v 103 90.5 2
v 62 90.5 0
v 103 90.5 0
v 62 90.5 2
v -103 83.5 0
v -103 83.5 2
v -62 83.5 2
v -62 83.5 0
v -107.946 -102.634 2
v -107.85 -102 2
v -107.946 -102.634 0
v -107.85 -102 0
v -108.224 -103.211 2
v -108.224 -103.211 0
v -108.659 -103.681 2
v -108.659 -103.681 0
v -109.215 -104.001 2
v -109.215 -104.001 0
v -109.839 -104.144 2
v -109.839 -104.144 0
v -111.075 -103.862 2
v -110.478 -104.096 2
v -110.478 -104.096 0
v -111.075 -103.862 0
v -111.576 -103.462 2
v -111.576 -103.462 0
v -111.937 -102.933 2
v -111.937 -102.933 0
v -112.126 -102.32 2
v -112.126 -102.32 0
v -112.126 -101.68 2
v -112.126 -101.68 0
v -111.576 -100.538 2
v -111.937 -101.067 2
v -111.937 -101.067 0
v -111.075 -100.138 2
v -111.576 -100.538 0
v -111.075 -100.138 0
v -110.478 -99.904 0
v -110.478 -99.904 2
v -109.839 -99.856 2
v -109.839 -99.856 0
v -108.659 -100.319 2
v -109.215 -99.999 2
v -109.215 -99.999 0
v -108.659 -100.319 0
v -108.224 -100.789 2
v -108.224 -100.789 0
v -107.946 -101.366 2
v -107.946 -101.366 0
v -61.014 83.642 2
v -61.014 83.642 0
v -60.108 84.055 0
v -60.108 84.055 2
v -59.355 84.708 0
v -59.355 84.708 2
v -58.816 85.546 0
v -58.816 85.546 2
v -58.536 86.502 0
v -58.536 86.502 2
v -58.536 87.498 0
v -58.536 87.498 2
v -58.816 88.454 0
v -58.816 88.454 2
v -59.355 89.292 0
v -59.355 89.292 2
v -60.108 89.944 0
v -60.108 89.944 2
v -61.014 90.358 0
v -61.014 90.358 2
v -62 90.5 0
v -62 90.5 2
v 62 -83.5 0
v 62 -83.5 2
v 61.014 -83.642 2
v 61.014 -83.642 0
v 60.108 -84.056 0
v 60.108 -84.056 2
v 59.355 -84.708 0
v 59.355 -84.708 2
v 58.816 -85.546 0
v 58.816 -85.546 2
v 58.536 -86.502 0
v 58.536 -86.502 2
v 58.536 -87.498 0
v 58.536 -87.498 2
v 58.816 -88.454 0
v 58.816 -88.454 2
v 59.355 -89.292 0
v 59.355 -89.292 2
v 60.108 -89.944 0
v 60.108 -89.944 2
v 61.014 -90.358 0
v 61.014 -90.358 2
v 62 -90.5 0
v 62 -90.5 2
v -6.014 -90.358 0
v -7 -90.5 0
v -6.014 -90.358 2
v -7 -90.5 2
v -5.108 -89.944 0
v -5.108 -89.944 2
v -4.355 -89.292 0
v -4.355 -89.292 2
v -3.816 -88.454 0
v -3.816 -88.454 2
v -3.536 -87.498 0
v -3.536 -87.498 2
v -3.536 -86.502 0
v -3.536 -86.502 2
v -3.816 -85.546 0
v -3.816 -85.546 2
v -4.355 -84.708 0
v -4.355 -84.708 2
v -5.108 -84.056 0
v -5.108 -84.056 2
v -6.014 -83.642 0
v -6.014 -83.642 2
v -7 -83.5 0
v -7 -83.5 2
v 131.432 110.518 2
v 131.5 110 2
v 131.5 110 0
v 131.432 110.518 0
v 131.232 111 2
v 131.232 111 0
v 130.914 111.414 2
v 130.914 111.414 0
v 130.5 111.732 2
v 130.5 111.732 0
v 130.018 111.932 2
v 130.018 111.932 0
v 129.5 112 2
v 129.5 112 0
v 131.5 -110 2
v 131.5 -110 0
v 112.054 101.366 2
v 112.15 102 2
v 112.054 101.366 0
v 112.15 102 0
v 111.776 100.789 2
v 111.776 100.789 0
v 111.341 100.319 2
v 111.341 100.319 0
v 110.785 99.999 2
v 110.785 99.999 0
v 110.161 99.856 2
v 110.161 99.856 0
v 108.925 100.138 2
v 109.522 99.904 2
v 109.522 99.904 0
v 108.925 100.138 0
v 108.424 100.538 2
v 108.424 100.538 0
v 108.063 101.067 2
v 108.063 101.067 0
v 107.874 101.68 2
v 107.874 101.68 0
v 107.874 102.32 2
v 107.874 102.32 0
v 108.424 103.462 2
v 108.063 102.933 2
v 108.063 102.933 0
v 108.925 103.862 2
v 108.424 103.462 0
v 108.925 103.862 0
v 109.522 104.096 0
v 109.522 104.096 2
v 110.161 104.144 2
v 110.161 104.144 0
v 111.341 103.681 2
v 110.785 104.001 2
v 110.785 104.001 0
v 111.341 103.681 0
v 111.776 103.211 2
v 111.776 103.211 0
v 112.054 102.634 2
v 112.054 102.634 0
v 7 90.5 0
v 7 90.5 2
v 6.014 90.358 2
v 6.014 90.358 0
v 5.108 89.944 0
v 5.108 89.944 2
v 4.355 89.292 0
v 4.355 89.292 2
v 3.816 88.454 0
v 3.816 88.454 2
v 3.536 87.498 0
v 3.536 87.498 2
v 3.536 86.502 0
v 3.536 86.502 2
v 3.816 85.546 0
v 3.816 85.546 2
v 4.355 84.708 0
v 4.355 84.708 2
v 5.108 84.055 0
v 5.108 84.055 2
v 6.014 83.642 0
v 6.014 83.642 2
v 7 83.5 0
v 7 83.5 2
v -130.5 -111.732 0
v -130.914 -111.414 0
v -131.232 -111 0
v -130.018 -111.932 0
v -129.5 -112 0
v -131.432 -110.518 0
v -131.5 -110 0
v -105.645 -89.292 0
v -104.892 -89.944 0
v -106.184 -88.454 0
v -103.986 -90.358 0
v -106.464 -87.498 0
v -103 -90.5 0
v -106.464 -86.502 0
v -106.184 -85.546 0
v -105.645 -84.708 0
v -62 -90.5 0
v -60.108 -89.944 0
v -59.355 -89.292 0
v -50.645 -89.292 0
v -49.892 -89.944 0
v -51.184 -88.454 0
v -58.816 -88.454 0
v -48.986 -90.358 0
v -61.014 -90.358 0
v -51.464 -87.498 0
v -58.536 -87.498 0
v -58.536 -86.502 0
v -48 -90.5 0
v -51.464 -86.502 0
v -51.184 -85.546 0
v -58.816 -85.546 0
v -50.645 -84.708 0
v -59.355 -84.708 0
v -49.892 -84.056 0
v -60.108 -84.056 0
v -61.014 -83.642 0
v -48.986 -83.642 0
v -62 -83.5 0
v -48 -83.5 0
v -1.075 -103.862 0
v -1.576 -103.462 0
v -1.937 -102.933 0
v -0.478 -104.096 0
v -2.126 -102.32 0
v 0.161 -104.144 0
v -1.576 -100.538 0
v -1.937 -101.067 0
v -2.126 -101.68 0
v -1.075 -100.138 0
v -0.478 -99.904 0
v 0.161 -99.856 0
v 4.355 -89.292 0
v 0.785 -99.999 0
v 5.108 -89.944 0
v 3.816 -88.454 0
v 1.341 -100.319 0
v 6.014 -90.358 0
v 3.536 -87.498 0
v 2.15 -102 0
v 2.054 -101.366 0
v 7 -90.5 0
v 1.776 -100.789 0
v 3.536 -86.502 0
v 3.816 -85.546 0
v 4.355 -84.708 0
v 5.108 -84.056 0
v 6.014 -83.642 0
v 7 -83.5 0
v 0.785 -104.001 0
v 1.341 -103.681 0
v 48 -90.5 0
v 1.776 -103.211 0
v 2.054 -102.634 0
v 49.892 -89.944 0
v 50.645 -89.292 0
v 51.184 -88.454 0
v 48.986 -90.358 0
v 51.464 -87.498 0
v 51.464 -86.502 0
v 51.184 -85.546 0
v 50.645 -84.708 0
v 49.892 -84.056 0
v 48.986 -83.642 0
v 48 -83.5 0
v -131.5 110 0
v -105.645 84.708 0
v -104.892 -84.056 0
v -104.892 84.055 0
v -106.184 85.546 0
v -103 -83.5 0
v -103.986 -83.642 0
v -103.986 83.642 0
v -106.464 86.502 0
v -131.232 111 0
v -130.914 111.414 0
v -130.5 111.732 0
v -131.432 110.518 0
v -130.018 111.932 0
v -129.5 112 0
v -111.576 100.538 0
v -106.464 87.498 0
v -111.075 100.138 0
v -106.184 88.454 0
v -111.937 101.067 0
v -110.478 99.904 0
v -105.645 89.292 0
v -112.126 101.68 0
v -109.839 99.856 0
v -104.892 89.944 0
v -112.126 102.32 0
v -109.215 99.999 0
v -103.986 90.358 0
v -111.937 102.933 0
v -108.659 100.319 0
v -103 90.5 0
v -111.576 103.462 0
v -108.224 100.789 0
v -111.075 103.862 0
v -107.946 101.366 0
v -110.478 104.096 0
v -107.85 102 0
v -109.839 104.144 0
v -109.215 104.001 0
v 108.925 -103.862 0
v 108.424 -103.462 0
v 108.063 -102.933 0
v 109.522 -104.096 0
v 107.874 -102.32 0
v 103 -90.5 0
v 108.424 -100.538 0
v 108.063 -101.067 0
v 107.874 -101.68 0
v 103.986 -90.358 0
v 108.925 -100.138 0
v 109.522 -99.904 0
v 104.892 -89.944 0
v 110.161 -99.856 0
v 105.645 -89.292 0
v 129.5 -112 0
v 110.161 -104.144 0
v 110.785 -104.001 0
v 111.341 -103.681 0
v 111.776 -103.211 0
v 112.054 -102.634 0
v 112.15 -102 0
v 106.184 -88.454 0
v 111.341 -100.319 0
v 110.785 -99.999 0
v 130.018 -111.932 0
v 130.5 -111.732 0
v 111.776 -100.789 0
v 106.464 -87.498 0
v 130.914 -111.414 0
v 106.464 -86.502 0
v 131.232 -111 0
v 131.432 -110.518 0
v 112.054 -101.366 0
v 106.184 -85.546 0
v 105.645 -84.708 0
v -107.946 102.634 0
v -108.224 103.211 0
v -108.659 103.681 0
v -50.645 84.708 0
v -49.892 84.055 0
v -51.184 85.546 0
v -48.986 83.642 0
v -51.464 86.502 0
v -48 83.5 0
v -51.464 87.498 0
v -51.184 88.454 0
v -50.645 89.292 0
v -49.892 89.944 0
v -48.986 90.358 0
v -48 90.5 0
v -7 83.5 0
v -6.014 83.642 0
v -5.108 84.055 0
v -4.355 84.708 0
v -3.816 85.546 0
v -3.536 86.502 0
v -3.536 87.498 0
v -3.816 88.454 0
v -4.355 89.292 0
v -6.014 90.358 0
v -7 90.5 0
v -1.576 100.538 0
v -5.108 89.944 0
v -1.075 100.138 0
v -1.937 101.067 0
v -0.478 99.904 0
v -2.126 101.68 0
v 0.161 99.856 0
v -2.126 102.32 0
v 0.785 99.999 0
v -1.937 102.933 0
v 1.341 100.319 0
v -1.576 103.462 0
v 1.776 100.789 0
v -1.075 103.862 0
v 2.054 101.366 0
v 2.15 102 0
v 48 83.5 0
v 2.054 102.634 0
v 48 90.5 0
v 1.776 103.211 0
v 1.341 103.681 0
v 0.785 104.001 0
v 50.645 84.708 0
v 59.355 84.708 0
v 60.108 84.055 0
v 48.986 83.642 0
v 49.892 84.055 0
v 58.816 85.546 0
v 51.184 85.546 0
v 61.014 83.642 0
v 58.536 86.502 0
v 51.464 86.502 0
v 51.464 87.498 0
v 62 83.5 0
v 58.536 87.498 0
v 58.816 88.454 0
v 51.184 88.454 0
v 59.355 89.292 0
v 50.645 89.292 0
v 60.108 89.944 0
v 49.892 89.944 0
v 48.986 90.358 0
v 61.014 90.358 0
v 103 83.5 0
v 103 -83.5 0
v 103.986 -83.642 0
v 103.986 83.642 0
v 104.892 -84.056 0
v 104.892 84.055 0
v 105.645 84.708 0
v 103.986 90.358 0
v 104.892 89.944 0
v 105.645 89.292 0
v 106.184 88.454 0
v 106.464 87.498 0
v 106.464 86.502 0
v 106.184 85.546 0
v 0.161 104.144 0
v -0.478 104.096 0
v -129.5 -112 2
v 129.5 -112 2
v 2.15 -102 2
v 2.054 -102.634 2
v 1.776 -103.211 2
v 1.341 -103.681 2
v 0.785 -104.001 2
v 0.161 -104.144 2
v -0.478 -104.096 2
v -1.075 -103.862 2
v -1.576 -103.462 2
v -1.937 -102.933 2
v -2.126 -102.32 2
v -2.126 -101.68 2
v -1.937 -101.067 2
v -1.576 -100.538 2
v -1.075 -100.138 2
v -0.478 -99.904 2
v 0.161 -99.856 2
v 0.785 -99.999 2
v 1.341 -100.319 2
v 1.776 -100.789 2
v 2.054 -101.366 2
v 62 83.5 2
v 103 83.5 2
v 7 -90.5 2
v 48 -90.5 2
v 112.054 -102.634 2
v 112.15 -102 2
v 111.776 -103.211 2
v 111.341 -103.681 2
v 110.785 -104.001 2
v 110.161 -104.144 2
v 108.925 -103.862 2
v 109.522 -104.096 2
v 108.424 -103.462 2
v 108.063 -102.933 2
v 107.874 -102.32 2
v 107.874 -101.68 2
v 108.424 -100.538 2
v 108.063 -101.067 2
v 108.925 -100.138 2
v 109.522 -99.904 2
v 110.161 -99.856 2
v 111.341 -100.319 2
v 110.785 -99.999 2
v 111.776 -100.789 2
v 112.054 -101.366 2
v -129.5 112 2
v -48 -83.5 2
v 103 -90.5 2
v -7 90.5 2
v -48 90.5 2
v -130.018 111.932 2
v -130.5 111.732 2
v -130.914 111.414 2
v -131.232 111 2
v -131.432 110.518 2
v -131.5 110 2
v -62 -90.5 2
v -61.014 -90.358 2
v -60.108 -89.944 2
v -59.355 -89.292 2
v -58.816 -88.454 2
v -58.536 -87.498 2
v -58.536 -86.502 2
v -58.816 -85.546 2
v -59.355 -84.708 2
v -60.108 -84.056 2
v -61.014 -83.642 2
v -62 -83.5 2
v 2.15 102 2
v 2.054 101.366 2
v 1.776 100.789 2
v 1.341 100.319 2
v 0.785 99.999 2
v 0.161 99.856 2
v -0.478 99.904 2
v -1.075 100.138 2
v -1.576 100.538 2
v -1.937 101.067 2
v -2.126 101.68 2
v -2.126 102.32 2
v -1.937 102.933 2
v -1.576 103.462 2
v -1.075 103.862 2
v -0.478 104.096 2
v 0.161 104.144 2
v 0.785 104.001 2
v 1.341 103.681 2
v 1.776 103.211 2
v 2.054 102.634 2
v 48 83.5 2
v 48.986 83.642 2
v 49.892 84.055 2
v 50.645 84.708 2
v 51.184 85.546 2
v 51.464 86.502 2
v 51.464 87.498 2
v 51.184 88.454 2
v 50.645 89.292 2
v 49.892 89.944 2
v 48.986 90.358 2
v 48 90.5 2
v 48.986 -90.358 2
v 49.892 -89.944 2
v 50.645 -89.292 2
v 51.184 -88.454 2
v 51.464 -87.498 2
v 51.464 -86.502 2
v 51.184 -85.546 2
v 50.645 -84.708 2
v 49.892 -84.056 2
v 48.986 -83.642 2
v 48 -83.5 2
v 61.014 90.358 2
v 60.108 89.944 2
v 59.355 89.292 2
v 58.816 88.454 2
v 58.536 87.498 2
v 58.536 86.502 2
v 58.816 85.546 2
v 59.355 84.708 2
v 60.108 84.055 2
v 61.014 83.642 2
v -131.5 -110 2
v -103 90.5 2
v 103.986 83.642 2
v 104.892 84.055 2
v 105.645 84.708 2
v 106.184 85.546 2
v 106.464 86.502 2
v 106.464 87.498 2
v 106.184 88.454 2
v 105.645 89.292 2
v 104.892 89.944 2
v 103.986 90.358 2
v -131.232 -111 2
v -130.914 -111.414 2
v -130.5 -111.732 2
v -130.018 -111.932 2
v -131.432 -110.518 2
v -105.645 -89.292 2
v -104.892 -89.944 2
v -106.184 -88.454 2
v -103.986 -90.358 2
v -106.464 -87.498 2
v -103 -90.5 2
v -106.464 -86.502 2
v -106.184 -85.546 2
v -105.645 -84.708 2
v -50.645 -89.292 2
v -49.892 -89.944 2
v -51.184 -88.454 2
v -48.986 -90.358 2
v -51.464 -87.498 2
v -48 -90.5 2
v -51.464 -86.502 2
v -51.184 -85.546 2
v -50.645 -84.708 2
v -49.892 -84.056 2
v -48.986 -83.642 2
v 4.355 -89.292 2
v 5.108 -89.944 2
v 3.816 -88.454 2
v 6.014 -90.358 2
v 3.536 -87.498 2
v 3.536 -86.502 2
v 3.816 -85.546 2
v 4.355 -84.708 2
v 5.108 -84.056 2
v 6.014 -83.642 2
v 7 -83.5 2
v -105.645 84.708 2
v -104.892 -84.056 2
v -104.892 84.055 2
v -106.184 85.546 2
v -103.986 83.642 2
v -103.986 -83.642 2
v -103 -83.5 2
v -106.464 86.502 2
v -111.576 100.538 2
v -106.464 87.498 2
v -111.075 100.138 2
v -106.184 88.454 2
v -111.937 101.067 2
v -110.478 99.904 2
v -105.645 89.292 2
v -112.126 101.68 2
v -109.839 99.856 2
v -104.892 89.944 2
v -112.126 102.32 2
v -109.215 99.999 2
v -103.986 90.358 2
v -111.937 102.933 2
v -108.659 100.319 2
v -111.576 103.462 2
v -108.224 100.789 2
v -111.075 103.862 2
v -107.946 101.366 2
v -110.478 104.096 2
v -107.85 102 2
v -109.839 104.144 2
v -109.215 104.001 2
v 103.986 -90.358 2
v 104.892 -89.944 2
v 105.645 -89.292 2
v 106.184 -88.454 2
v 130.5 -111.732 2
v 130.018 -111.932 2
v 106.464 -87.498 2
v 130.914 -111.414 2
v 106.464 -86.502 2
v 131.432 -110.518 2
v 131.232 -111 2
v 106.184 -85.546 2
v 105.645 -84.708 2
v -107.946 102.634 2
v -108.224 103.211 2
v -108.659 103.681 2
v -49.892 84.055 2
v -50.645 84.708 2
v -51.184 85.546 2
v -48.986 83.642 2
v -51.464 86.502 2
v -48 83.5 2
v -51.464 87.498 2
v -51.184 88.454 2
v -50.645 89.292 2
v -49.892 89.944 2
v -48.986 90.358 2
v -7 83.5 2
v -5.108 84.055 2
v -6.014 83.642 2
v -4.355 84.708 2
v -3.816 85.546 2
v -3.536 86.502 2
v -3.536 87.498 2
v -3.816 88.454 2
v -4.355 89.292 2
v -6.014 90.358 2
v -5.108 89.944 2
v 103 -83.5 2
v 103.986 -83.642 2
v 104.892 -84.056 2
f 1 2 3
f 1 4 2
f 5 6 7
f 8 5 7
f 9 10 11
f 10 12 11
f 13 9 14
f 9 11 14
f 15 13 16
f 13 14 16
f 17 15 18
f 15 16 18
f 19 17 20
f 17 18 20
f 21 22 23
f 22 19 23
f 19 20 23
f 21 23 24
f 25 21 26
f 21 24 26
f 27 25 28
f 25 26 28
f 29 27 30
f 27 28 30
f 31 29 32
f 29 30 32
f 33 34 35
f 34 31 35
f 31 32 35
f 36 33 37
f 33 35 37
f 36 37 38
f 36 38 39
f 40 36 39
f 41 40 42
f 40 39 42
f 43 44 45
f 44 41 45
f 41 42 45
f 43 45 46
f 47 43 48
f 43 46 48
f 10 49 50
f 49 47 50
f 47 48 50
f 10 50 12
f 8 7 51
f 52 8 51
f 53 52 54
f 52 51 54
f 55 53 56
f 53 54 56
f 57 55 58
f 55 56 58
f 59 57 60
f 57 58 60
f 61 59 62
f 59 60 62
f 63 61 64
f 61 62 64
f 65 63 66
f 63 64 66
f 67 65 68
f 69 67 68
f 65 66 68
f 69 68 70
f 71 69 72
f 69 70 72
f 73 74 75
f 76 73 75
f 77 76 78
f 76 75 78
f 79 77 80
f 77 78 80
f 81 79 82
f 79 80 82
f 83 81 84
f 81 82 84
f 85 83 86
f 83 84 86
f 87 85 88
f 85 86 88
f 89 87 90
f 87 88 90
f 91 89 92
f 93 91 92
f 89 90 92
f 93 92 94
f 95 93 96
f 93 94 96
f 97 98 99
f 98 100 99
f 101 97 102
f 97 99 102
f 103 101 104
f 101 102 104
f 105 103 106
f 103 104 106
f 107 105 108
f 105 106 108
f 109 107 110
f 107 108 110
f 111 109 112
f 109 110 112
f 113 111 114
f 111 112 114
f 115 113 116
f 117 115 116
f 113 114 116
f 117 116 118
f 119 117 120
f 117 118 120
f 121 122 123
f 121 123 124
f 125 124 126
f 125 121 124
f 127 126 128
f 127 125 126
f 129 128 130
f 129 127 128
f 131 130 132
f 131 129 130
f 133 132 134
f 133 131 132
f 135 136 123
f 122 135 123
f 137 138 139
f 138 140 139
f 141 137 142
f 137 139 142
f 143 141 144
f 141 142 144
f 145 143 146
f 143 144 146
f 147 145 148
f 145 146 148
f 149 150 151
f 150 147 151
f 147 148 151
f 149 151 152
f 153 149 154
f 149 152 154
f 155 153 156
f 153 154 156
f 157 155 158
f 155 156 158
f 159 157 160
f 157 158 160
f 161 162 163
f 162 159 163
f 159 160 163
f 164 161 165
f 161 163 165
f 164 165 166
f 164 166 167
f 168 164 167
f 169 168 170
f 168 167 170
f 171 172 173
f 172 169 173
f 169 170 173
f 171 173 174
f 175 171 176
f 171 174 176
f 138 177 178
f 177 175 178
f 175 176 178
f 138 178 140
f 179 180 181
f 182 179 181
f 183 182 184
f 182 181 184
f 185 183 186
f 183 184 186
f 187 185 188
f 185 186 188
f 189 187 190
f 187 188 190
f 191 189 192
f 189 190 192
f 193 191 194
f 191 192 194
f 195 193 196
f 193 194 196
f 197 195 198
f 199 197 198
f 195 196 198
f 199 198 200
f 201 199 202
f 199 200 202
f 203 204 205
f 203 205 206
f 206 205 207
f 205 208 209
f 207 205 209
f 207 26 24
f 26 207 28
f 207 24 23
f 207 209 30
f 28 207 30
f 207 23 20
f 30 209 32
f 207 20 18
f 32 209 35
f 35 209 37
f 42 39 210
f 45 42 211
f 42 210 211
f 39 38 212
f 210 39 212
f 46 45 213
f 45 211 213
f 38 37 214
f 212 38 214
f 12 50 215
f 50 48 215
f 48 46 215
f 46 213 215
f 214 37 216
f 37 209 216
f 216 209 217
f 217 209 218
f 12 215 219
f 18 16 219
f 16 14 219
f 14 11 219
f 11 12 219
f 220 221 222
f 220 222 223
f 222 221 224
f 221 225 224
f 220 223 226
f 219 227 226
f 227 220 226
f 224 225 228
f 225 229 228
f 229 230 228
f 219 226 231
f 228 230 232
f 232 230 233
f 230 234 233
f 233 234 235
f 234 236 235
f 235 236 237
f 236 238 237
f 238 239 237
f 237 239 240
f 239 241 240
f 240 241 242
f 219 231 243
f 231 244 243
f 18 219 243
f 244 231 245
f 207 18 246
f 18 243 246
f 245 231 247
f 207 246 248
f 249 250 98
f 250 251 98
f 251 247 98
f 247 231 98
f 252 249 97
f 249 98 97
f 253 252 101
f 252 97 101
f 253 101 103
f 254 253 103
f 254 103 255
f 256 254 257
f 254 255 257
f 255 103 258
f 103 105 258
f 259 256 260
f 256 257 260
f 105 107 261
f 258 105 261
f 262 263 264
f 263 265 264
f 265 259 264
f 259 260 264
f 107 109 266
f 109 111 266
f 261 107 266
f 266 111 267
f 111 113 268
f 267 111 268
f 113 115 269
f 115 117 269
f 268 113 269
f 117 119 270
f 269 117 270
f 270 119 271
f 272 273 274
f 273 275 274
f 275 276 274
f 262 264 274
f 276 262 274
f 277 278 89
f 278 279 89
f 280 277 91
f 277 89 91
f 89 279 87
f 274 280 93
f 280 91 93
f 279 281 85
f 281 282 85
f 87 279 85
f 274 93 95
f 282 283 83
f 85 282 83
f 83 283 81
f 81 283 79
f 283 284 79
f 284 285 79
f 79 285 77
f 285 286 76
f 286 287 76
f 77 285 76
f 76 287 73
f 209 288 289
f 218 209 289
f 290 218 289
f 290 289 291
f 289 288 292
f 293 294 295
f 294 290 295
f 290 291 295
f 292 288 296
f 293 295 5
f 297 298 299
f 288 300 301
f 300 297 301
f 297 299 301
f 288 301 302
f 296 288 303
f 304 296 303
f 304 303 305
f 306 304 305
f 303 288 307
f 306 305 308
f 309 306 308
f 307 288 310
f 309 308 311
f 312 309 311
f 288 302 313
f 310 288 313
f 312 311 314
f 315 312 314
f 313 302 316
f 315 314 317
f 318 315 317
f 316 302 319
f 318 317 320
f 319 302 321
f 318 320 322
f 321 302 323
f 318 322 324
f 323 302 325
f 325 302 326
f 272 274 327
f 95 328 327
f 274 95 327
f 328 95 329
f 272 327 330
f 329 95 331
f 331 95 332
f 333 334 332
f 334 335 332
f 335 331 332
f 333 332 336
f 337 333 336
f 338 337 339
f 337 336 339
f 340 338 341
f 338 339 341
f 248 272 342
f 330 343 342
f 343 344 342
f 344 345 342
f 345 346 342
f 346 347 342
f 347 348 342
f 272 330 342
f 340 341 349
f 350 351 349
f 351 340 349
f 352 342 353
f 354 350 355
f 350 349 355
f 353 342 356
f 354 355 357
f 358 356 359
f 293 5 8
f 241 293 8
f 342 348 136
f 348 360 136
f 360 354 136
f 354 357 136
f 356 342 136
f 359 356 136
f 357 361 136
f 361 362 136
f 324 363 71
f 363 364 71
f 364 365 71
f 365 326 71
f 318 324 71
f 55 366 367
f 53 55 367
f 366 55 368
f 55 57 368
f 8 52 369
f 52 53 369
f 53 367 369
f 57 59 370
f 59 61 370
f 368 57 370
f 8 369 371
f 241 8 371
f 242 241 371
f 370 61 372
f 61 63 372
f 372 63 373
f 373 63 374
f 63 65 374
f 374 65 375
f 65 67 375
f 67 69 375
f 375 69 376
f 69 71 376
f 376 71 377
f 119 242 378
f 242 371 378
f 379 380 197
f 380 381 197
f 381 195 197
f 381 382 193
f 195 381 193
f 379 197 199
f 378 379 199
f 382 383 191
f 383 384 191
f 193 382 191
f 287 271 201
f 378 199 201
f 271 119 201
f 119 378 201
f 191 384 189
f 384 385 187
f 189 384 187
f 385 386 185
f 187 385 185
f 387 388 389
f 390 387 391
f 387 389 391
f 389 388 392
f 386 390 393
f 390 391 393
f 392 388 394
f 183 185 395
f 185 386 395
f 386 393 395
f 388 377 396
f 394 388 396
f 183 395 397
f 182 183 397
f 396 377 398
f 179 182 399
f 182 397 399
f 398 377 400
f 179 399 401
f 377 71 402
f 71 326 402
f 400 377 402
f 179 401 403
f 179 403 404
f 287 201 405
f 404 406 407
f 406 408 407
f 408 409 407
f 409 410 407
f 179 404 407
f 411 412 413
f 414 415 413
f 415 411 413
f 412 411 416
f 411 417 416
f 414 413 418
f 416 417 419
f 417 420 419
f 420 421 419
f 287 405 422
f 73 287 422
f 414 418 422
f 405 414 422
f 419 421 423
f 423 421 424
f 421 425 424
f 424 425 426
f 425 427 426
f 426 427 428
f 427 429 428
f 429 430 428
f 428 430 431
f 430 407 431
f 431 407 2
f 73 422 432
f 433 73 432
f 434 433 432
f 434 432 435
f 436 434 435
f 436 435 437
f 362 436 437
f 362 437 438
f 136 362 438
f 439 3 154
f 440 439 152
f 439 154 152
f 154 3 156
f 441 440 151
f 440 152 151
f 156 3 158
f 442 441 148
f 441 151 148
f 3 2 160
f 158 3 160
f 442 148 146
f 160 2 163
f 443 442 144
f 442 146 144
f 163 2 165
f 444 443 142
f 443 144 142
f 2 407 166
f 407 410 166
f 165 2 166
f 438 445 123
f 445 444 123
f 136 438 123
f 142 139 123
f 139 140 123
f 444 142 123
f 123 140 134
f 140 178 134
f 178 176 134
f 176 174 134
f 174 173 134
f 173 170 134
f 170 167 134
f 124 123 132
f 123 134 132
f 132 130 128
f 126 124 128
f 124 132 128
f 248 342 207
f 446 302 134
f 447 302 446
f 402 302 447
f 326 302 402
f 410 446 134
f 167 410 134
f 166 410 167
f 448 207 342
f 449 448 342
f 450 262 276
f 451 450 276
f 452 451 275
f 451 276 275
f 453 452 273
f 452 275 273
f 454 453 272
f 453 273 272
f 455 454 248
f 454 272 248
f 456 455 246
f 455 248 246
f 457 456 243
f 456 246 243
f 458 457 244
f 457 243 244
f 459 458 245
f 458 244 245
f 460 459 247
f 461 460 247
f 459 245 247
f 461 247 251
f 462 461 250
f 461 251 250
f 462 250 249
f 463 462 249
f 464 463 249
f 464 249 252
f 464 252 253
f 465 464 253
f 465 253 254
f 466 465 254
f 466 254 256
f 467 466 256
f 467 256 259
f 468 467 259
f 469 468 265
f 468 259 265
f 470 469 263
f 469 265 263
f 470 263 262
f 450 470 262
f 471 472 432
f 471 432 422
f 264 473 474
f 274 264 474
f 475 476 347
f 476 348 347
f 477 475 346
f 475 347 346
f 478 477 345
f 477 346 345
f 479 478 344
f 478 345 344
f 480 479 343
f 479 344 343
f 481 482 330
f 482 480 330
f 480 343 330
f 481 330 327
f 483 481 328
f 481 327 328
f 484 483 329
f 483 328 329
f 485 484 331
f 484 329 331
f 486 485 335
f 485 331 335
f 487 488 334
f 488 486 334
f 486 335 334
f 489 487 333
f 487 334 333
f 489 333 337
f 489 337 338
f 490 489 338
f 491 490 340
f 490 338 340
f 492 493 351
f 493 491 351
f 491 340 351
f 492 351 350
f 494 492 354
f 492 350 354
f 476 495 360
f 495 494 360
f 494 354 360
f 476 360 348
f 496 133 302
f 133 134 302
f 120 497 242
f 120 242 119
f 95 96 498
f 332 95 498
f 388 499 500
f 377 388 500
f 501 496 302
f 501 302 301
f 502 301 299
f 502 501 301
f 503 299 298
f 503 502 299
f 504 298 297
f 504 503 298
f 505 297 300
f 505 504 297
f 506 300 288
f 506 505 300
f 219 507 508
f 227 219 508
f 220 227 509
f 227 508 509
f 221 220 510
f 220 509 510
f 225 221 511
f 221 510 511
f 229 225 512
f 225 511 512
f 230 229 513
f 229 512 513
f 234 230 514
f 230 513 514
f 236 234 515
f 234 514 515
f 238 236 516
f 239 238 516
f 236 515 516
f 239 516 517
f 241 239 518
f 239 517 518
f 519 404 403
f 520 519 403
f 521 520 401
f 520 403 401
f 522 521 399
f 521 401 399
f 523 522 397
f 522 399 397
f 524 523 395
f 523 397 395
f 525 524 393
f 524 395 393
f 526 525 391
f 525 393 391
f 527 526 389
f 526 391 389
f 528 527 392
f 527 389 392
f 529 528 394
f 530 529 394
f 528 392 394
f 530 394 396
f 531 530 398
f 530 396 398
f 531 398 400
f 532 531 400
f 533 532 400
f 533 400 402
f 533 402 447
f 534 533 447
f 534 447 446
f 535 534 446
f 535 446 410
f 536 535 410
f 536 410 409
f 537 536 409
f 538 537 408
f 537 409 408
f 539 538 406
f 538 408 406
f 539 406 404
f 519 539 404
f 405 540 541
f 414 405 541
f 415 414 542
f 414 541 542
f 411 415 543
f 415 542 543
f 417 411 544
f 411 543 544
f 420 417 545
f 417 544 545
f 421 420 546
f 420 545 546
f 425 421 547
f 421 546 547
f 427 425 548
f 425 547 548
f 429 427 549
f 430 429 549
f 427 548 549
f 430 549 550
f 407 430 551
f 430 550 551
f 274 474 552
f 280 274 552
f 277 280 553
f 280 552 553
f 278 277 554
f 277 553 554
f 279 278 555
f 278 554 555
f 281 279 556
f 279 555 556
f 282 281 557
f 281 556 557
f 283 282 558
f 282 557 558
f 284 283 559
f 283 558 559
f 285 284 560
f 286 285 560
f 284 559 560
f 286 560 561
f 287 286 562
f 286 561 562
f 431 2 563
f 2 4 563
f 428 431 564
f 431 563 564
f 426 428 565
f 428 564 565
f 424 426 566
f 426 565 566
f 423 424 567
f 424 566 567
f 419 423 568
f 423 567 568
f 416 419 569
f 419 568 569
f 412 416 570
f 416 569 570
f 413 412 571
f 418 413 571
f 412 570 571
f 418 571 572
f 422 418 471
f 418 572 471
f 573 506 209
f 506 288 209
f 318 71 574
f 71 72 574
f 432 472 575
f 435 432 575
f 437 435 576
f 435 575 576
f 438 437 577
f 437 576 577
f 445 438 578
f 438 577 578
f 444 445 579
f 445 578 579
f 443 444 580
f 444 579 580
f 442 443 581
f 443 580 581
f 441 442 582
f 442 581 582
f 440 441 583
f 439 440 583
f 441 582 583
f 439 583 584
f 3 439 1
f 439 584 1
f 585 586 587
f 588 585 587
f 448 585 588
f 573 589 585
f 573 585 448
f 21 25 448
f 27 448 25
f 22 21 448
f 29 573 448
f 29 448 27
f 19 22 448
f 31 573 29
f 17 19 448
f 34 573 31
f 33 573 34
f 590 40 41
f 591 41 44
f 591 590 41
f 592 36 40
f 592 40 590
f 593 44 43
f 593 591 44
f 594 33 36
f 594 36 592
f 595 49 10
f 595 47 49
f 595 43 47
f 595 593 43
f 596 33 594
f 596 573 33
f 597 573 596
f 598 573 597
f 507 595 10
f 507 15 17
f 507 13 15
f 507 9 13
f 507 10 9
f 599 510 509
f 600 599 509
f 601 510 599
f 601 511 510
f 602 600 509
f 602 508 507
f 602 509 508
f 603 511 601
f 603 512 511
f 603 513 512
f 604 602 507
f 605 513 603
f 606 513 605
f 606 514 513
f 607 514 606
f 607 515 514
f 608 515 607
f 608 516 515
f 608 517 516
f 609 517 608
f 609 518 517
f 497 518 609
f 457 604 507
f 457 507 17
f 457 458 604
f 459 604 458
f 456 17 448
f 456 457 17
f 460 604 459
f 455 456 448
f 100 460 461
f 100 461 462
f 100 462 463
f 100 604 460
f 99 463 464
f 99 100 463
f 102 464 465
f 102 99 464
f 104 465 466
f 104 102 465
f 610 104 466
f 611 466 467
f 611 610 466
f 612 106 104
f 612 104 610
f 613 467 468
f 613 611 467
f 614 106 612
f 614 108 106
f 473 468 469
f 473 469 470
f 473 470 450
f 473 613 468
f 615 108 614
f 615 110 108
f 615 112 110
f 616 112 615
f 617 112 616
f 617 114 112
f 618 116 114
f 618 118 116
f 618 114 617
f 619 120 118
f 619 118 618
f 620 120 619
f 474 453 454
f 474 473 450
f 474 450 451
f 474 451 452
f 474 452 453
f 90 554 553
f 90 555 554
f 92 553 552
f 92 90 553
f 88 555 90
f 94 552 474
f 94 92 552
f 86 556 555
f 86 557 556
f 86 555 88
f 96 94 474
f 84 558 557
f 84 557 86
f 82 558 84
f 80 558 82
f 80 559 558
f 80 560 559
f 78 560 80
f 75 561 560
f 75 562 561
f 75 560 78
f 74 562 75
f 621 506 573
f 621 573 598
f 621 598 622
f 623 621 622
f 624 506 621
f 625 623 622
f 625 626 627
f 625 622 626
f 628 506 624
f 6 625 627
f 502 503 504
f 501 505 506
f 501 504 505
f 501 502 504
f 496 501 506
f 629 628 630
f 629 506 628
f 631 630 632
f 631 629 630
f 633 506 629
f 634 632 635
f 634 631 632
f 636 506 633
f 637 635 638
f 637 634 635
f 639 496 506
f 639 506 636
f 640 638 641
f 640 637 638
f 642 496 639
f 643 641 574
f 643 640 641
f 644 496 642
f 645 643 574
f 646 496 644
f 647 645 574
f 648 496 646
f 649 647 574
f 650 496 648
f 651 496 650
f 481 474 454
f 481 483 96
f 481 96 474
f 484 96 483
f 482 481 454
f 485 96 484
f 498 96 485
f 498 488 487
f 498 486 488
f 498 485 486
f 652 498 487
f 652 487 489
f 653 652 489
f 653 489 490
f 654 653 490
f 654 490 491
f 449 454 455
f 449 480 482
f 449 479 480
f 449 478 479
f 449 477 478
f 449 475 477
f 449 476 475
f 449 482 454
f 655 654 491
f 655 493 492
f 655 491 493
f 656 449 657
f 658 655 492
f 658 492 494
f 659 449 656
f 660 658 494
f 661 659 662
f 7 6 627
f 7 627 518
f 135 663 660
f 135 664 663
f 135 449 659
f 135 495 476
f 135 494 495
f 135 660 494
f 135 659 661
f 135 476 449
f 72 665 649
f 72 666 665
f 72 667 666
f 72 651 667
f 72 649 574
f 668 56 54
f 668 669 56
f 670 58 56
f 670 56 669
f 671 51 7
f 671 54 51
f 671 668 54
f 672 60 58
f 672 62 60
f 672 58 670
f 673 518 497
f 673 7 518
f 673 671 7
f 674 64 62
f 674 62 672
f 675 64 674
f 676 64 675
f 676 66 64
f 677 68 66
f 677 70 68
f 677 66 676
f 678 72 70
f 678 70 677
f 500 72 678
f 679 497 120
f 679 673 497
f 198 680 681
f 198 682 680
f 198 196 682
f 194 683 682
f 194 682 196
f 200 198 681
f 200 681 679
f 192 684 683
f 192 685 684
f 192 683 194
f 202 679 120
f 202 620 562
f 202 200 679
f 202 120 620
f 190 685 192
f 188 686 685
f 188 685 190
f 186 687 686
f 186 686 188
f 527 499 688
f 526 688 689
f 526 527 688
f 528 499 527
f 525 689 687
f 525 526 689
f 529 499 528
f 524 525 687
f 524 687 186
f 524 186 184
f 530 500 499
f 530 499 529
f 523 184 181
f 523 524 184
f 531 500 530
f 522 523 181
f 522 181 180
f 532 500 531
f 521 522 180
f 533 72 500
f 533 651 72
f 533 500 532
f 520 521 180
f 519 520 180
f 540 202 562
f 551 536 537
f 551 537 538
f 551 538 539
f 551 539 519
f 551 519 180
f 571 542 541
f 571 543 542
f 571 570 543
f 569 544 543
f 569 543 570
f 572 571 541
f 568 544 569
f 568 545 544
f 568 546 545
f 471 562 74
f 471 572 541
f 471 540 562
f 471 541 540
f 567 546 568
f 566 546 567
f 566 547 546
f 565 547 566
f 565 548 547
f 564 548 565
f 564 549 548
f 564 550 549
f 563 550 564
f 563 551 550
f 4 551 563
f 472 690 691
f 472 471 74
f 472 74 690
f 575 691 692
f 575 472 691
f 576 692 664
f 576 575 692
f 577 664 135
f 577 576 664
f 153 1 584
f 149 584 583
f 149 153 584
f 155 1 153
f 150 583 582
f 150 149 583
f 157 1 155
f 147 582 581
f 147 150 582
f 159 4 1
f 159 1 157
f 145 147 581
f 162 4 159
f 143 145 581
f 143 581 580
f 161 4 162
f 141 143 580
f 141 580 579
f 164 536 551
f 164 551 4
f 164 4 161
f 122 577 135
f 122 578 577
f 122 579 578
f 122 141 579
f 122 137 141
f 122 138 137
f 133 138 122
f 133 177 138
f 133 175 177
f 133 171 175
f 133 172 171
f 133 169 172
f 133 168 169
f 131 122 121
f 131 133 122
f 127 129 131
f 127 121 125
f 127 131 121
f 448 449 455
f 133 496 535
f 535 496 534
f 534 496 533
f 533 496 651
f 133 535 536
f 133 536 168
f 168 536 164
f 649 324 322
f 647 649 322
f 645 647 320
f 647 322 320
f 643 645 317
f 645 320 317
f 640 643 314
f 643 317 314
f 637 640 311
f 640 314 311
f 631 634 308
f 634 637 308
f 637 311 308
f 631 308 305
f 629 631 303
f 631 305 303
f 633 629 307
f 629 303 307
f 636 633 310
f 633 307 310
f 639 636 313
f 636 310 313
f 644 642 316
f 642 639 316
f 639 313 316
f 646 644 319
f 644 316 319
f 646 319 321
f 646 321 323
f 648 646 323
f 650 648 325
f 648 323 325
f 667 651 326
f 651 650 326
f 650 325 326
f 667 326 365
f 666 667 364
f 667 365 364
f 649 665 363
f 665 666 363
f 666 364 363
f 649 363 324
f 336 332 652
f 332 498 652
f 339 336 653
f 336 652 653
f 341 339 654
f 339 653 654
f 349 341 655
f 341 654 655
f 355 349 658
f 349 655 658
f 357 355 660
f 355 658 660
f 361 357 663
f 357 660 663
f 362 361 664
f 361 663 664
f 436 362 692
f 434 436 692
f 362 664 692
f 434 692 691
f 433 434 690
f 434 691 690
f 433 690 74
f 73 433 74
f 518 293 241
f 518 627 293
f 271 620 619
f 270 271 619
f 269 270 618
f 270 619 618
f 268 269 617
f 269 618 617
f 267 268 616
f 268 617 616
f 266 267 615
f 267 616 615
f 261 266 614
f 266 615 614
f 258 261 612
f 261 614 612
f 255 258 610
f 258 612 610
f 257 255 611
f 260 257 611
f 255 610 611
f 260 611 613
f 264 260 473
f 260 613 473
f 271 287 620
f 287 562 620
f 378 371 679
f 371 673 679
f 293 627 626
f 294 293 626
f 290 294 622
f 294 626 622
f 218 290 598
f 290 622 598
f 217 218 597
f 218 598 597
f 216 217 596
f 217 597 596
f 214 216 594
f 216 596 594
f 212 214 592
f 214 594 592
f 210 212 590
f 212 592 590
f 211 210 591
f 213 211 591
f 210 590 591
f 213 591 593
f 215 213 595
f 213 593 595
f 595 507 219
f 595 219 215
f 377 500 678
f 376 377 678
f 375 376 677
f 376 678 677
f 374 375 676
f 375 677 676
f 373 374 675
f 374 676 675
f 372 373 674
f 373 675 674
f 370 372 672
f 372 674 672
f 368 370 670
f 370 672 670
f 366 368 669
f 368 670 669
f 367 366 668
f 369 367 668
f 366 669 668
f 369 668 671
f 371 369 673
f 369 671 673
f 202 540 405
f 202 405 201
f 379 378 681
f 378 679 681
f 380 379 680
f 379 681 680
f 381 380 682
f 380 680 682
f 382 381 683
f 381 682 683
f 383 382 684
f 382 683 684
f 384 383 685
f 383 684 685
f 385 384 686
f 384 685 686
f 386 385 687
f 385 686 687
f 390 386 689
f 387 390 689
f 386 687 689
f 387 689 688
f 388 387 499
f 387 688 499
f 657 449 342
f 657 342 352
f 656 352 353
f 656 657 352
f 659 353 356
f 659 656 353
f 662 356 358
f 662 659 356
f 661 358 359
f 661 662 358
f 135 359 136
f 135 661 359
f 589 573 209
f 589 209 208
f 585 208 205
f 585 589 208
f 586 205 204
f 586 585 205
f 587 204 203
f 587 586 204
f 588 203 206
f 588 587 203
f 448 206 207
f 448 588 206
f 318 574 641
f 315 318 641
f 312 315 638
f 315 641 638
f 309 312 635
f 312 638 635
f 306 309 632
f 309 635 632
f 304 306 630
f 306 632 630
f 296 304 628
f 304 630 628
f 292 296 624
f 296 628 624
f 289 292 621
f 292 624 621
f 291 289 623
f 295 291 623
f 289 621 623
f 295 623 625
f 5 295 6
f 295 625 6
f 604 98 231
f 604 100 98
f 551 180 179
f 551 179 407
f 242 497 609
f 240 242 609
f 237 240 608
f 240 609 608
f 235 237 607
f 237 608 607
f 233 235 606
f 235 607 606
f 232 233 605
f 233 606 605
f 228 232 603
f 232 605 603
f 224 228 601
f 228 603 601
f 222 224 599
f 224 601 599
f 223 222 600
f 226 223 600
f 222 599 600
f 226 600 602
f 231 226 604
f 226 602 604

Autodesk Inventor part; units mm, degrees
ref_plane "YZ Plane" through (0, 0, 0) normal (1, 0, 0) x (0, 1, 0)
ref_plane "XZ Plane" through (0, 0, 0) normal (0, 1, 0) x (-1, 0, 0)
ref_plane "XY Plane" through (0, 0, 0) normal (0, 0, 1) x (1, 0, 0)
sketch "Skizze1" plane through (0, 0, 0) normal (0, 0, 1) x (1, 0, 0)
  line L0 (-131.5, -112) -> (131.5, -112)
  line L1 (131.5, -112) -> (131.5, 112)
  line L2 (131.5, 112) -> (-131.5, 112)
  line L3 (-131.5, 112) -> (-131.5, -112)
  line L4 (-131.5, -112) -> (131.5, 112) construction
  line L5 (131.5, -112) -> (-131.5, 112) construction
  circle A0 centre (0, 102) radius 2.15
  line L6 (0, 156.8) -> (0, -156.8)
  circle A1 centre (-110, 102) radius 2.15
  circle A2 centre (110, 102) radius 2.15
  line L7 (-131.5, 0) -> (131.5, 0) construction
  circle A3 centre (0, -102) radius 2.15
  circle A4 centre (-110, -102) radius 2.15
  circle A5 centre (110, -102) radius 2.15
  point P0 (0, 0)
  dimension "d0" = 263
  dimension "d1" = 224
  dimension "d2" = 4.3
  dimension "d3" = 0
  dimension "d4" = 10
  dimension "d5" = 4.3
  dimension "d6" = 4.3
  dimension "d7" = 10
  dimension "d8" = 10
  dimension "d9" = 110
  dimension "d10" = 110
extrude "Grobblech1" add sketch "Skizze1" along normal blind 2 contours L3 L2 L6 A0 A3 L0 | L6 A3 A0 L2 L1 L0
fillet "Rundung1" radius 2 4 edges at (131.5, 112, 1) (131.5, -112, 1) (-131.5, -112, 1) (-131.5, 112, 1)
sketch "Skizze2" plane through (0, 0, 2) normal (0, 0, 1) x (1, 0, 0)
  arc A0 (-129.5, 112) -> (-131.5, 110) centre (-129.5, 110) ccw projected
  line L0 (-131.5, -110) -> (-131.5, 110) projected
  arc A1 (-131.5, -110) -> (-129.5, -112) centre (-129.5, -110) ccw projected
  line L1 (129.5, -112) -> (-129.5, -112) projected
  arc A2 (129.5, -112) -> (131.5, -110) centre (129.5, -110) ccw projected
  line L2 (131.5, 110) -> (131.5, -110) projected
  arc A3 (131.5, 110) -> (129.5, 112) centre (129.5, 110) ccw projected
  line L3 (-129.5, 112) -> (129.5, 112) projected
  circle A4 centre (110, -102) radius 2.15 projected
  circle A5 centre (0, -102) radius 2.15 projected
  circle A6 centre (-110, -102) radius 2.15 projected
  circle A7 centre (110, 102) radius 2.15 projected
  circle A8 centre (-110, 102) radius 2.15 projected
  circle A9 centre (0, 102) radius 2.15 projected
  line L4 (119.9374, -87) -> (-120.447, -87) construction
  line L5 (3.5, -87) -> (51.5, -87) construction
  line L6 (7, -90.5) -> (48, -90.5)
  line L7 (48, -83.5) -> (7, -83.5)
  arc A10 (7, -83.5) -> (7, -90.5) centre (7, -87) ccw
  arc A11 (48, -90.5) -> (48, -83.5) centre (48, -87) ccw
  line L8 (58.5, -87) -> (106.5, -87) construction
  line L9 (62, -90.5) -> (103, -90.5)
  line L10 (103, -83.5) -> (62, -83.5)
  arc A12 (62, -83.5) -> (62, -90.5) centre (62, -87) ccw
  arc A13 (103, -90.5) -> (103, -83.5) centre (103, -87) ccw
  line L11 (0, -102) -> (0, 102) construction
  line L12 (-327.71, -0.0001) -> (282.76, -0.0001) construction
  line L13 (-3.5, -87) -> (-51.5, -87) construction
  line L14 (-7, -90.5) -> (-48, -90.5)
  line L15 (-48, -83.5) -> (-7, -83.5)
  arc A14 (-7, -90.5) -> (-7, -83.5) centre (-7, -87) ccw
  arc A15 (-48, -83.5) -> (-48, -90.5) centre (-48, -87) ccw
  arc A16 (-62, -90.5) -> (-62, -83.5) centre (-62, -87) ccw
  line L16 (-62, -90.5) -> (-103, -90.5)
  line L17 (-103, -83.5) -> (-62, -83.5)
  line L18 (-58.5, -87) -> (-106.5, -87) construction
  arc A17 (-103, -83.5) -> (-103, -90.5) centre (-103, -87) ccw
  line L19 (3.5, 86.9998) -> (51.5, 86.9998) construction
  line L20 (7, 90.4998) -> (48, 90.4998)
  line L21 (48, 83.4998) -> (7, 83.4998)
  arc A18 (7, 90.4998) -> (7, 83.4998) centre (7, 86.9998) ccw
  arc A19 (48, 83.4998) -> (48, 90.4998) centre (48, 86.9998) ccw
  arc A20 (62, 90.4998) -> (62, 83.4998) centre (62, 86.9998) ccw
  line L22 (62, 90.4998) -> (103, 90.4998)
  line L23 (103, 83.4998) -> (62, 83.4998)
  line L24 (58.5, 86.9998) -> (106.5, 86.9998) construction
  arc A21 (103, 83.4998) -> (103, 90.4998) centre (103, 86.9998) ccw
  line L25 (-3.5, 86.9998) -> (-51.5, 86.9998) construction
  line L26 (-58.5, 86.9998) -> (-106.5, 86.9998) construction
  line L27 (-7, 90.4998) -> (-48, 90.4998)
  line L28 (-62, 90.4998) -> (-103, 90.4998)
  arc A22 (-7, 83.4998) -> (-7, 90.4998) centre (-7, 86.9998) ccw
  line L29 (-48, 83.4998) -> (-7, 83.4998)
  arc A23 (-48, 90.4998) -> (-48, 83.4998) centre (-48, 86.9998) ccw
  arc A24 (-62, 83.4998) -> (-62, 90.4998) centre (-62, 86.9998) ccw
  line L30 (-103, 83.4998) -> (-62, 83.4998)
  arc A25 (-103, 90.4998) -> (-103, 83.4998) centre (-103, 86.9998) ccw
  point P0 (0, 0)
  point P1 (65.6161, -112)
  point P2 (15.6161, -112)
  point P3 (-15.6161, -112)
  point P4 (-65.6161, -112)
  point P5 (5.6161, -112)
  point P6 (-5.6161, -112)
  point P7 (27.5, -87)
  point P8 (82.5, -87)
  point P9 (-119.9374, -87)
  point P10 (-27.5, -87)
  point P11 (-82.5, -87)
  point P12 (27.5, 86.9998)
  point P13 (82.5, 86.9998)
  point P14 (-27.5, 86.9998)
  point P15 (-82.5, 86.9998)
  dimension "d13" = 25
  dimension "d14" = 110
  dimension "d15" = 48
  dimension "d16" = 7
  dimension "d17" = 3.5
  dimension "d18" = 48
  dimension "d19" = 7
  dimension "d20" = 7
  dimension "d21" = 3.5
extrude "Extrusion1" cut sketch "Skizze2" against normal blind 10 contours A10 L7 A11 L6 | A12 L10 A13 L9 | L14 A15 L15 A14 | L16 A17 L17 A16 | L20 A19 L21 A18 | L22 A21 L23 A20 | A22 L29 A23 L27 | A24 L30 A25 L28
equation "\"d5\" = d2"
equation "\"d6\" = d2"
equation "\"d7\" = d4"
equation "\"d8\" = d4"
equation "\"d11\" = Stärke"
equation "\"Biegeradius\" = Stärke"
equation "\"BreiteBiegungsfreistellung\" = Stärke"
equation "\"TiefeBiegungsfreistellung\" = 0.5 * Stärke"
equation "\"GrößeEckenfreistellung\" = 4 * Stärke"
equation "\"MinimalRest\" = 2 * Stärke"
equation "\"Übergangsradius\" = Biegeradius"
equation "\"JacobiRadiusGröße\" = Biegeradius"
equation "\"Abstandsgröße\" = Stärke"
equation "\"Stärke\" = 2"
properties part number "Deckel"
